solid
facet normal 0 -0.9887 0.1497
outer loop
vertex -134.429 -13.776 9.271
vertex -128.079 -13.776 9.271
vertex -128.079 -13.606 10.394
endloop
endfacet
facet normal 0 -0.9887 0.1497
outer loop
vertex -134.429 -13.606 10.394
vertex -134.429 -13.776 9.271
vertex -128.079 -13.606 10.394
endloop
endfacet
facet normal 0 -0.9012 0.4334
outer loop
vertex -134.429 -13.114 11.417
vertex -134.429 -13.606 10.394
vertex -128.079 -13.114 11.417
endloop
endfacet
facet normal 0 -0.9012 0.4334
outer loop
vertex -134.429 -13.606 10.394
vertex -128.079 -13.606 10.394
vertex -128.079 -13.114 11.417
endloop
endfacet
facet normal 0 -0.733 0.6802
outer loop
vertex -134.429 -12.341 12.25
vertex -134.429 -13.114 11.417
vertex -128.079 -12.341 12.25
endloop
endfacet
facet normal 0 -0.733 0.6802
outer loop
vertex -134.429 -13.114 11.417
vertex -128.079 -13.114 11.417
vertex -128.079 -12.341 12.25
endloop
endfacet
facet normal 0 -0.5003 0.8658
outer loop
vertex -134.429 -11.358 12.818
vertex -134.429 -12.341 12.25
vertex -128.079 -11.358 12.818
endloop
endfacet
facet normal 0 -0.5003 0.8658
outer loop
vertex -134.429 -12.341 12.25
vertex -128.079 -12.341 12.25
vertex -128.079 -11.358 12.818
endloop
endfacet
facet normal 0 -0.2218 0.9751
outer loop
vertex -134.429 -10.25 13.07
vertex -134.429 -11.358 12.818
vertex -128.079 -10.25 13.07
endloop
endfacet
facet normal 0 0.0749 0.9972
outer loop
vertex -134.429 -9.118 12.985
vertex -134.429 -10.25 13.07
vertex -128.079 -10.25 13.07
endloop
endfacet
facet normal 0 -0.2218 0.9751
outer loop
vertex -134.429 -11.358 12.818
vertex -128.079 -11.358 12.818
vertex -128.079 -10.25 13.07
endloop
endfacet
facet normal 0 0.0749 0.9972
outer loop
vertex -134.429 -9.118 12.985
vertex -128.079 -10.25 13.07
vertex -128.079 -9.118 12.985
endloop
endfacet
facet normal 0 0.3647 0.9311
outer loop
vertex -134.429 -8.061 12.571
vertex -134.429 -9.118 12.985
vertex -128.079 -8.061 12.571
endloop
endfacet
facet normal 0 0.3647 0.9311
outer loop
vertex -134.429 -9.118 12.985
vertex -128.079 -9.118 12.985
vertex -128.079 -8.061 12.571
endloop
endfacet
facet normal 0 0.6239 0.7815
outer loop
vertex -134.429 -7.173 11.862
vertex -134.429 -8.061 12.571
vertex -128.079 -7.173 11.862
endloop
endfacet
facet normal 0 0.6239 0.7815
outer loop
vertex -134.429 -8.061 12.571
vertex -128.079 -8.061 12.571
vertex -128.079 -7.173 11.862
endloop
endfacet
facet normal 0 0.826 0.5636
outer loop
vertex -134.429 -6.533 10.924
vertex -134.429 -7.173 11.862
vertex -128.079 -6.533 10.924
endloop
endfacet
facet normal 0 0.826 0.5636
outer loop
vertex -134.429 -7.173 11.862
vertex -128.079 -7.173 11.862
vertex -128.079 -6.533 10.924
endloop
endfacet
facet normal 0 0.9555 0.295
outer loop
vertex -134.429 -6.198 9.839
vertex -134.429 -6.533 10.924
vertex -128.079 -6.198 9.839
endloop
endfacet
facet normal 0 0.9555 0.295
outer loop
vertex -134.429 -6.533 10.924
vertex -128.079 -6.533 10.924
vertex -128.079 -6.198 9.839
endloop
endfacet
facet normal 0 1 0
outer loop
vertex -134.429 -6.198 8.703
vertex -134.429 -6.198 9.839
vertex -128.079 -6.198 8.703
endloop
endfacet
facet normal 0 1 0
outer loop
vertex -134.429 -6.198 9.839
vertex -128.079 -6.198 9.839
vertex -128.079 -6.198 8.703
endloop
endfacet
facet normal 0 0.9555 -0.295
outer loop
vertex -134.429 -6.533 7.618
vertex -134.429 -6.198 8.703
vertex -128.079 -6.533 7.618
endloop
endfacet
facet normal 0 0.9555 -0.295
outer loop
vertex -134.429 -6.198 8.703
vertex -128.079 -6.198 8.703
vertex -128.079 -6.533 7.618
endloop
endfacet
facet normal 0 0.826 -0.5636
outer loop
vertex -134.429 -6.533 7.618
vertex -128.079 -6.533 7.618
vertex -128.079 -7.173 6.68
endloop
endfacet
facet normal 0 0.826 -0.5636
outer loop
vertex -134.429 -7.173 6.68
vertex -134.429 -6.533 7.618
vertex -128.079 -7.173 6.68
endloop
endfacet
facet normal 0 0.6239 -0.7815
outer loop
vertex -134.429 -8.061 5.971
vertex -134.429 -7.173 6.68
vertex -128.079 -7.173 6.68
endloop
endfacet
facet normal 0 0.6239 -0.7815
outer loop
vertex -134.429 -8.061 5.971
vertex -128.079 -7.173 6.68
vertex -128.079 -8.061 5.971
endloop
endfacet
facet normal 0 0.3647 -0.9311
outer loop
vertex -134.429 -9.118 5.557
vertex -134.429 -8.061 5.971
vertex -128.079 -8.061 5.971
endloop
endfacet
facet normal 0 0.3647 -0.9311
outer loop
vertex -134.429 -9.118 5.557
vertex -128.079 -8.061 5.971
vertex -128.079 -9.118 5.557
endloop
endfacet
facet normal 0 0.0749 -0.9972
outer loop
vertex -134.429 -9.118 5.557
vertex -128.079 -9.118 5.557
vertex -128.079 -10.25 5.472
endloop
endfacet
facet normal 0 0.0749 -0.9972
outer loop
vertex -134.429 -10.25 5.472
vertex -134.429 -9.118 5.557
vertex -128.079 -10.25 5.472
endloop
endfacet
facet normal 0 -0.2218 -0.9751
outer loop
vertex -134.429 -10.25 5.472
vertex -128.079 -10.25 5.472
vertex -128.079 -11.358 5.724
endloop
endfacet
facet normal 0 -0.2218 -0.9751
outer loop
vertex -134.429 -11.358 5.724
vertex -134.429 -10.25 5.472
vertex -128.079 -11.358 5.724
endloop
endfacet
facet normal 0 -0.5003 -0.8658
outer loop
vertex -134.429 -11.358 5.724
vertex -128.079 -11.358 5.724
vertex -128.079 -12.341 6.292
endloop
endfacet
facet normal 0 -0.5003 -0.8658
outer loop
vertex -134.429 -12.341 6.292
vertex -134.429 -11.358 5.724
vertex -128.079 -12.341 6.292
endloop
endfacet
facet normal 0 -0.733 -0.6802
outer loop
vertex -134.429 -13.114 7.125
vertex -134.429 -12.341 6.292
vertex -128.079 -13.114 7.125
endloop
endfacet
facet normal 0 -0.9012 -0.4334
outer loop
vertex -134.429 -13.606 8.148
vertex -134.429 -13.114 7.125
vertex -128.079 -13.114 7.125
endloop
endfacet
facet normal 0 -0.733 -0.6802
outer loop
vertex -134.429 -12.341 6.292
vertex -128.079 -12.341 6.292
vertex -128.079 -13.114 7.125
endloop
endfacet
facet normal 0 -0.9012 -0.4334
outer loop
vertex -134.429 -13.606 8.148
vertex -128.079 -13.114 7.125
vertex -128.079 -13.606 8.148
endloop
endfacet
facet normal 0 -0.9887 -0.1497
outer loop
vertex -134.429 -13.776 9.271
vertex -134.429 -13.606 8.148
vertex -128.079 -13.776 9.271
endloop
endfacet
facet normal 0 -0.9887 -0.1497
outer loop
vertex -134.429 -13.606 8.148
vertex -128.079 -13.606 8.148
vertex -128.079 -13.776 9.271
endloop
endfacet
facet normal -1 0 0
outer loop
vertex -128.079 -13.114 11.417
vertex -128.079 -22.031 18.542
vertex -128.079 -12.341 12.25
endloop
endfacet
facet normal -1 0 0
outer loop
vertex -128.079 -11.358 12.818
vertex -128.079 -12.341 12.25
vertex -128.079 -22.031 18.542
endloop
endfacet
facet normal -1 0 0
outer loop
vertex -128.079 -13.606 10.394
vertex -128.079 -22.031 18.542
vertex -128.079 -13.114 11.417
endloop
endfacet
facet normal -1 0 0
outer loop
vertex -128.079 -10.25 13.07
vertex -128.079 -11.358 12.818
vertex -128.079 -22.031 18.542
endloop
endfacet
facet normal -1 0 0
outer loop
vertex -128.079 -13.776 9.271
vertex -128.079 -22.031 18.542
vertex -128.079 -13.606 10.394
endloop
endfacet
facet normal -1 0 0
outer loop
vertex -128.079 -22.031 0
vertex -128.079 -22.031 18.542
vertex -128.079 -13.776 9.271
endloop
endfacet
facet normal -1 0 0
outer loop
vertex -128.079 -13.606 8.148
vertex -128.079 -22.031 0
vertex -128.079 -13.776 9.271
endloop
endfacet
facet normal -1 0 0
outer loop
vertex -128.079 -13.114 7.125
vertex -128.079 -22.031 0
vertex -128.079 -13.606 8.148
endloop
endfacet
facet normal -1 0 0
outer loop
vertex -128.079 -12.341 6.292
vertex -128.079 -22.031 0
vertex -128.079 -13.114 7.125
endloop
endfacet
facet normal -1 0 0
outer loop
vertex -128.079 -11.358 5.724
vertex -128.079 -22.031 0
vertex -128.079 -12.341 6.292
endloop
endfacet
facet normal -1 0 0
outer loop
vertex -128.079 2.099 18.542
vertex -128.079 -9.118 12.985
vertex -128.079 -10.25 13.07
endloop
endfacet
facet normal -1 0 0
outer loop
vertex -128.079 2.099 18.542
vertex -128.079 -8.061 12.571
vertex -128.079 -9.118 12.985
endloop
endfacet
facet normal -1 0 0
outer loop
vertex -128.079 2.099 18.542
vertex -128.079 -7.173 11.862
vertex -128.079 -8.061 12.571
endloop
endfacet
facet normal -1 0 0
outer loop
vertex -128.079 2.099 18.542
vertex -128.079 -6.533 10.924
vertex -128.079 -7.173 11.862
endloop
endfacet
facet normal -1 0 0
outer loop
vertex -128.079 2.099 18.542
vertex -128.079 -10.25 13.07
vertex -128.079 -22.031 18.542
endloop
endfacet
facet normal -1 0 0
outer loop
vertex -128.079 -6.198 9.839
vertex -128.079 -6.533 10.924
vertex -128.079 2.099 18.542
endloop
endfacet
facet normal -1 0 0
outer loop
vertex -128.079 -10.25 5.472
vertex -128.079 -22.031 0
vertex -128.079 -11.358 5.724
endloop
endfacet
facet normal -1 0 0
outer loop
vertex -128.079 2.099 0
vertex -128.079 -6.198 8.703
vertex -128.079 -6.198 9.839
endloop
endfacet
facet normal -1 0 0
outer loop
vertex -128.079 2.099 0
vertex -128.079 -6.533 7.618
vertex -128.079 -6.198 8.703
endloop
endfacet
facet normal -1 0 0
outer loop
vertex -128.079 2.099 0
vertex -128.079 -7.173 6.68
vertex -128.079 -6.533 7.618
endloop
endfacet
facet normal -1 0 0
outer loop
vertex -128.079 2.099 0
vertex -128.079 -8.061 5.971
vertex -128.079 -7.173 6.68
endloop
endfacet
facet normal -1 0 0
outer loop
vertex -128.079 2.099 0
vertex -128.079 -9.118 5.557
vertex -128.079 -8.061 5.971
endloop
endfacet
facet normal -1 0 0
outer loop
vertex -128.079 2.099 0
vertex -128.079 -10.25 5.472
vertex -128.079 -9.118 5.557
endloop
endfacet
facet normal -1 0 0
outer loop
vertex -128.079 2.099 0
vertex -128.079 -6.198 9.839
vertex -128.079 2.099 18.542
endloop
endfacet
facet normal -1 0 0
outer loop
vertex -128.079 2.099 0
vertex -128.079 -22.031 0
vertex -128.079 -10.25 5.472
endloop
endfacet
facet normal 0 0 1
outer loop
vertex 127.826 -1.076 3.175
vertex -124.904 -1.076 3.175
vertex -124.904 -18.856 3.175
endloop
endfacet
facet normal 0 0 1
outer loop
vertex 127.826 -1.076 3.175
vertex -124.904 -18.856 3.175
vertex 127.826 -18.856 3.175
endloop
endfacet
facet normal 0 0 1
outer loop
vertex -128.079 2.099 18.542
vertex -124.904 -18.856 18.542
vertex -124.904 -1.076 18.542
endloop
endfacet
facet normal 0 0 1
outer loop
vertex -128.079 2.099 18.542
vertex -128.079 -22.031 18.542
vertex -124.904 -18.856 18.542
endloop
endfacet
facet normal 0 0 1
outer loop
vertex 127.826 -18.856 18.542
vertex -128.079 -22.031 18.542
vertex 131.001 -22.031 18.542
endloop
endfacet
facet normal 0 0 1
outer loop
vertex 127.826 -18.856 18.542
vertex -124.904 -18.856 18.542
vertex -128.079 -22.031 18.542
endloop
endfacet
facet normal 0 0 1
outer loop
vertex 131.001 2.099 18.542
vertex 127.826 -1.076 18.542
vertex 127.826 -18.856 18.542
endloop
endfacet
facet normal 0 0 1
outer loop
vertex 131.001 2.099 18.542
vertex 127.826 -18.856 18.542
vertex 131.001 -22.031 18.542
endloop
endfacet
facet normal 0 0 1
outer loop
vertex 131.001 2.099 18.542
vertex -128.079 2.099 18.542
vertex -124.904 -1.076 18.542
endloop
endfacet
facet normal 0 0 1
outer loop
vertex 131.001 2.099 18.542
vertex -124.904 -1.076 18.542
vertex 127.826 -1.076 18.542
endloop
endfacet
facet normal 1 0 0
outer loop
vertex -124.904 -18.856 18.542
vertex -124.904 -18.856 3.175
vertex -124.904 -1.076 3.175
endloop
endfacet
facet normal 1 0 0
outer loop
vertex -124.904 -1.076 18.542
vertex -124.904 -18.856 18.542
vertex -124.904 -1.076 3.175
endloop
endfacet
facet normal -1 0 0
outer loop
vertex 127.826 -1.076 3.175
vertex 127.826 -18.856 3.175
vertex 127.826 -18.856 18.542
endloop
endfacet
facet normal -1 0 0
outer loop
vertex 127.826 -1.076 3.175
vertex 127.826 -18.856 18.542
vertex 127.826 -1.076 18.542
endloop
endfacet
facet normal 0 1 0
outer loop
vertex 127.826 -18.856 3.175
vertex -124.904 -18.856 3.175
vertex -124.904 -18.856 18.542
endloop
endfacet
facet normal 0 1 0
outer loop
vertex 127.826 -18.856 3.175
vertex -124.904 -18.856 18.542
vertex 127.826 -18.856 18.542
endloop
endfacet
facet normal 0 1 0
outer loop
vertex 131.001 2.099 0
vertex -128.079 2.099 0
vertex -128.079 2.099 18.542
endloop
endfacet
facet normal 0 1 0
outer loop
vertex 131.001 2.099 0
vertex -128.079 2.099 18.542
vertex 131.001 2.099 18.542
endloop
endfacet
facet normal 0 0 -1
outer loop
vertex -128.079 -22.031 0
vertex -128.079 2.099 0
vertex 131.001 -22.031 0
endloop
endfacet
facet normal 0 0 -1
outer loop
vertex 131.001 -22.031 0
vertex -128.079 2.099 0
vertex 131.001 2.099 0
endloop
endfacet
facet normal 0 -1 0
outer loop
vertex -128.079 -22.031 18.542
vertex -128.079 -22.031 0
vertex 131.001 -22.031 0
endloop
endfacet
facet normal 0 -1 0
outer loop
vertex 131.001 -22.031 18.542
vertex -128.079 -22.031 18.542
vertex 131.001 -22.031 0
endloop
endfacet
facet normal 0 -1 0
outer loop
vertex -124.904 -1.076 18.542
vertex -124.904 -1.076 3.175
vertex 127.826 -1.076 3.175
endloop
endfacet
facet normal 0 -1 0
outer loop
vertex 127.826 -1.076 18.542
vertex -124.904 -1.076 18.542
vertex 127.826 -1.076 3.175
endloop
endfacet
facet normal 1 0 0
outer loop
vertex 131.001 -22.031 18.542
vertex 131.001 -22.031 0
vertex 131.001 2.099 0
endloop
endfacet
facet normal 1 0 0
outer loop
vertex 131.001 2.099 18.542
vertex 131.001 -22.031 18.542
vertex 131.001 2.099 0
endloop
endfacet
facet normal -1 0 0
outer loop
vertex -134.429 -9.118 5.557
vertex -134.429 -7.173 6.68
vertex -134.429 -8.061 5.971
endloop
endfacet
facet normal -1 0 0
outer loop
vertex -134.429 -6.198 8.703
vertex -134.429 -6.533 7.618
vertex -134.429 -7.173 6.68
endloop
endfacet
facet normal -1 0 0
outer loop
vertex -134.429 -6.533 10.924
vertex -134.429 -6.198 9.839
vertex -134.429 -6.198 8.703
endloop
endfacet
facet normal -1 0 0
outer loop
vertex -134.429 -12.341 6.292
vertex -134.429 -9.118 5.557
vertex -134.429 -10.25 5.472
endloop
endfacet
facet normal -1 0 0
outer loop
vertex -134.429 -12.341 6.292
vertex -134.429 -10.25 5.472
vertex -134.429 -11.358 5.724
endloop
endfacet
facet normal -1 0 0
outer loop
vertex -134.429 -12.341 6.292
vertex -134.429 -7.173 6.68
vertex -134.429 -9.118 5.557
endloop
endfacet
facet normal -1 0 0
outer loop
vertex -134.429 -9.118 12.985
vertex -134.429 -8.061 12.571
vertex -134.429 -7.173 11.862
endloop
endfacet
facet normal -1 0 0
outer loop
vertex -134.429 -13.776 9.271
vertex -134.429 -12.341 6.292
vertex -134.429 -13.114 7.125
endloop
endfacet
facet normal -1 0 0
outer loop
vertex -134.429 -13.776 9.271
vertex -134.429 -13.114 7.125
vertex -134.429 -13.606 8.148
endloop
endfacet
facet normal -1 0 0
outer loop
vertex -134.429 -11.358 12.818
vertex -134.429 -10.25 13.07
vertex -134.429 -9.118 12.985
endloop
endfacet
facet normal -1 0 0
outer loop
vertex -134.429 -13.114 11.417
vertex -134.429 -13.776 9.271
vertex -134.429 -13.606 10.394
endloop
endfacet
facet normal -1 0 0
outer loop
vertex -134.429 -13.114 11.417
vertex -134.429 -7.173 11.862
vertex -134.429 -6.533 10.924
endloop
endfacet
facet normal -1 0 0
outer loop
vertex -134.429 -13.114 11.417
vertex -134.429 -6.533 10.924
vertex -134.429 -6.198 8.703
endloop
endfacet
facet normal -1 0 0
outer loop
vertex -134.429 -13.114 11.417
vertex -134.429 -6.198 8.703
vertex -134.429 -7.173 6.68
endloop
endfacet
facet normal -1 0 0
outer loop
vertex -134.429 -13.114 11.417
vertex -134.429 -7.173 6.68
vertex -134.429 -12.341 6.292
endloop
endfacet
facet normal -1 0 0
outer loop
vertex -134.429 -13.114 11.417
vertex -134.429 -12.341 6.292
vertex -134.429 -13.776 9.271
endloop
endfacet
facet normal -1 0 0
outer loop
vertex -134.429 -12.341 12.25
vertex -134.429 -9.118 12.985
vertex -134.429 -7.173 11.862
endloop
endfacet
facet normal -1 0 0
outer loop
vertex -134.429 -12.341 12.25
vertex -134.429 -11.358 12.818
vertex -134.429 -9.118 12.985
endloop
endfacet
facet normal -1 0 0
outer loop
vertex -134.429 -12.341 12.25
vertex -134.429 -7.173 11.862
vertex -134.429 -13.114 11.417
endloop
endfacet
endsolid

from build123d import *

# Parameters (mm, degrees)
F0_W     = 252.73
F0_H     = 17.78
F1_DEPTH = 3.175
F0_W_2   = 259.08
F0_H_2   = 24.13
F2_DEPTH = 18.542
F3_R     = 3.81
F4_DEPTH = 6.35


with BuildPart() as f1:
    # F0 (on Top) → F1 (new body)
    with BuildSketch(Plane.XY):
        with Locations((1.460627, -9.965609)):
            Rectangle(F0_W, F0_H)
    extrude(amount=F1_DEPTH)

    # F0 (on Top) → F2 (join)
    with BuildSketch(Plane.XY):
        with Locations((1.460627, -9.965609)):
            Rectangle(F0_W_2, F0_H_2)
        with Locations((1.460627, -9.965609)):
            Rectangle(F0_W, F0_H, mode=Mode.SUBTRACT)
    extrude(amount=F2_DEPTH)

    # F3 (on face) → F4 (join)
    with BuildSketch(Plane(origin=(-128.079373, 0, 0), x_dir=(0, -1, 0), z_dir=(-1, 0, 0))):
        with Locations((9.965609, 9.271)):
            Circle(F3_R)
    extrude(amount=F4_DEPTH)


solid = f1.part
